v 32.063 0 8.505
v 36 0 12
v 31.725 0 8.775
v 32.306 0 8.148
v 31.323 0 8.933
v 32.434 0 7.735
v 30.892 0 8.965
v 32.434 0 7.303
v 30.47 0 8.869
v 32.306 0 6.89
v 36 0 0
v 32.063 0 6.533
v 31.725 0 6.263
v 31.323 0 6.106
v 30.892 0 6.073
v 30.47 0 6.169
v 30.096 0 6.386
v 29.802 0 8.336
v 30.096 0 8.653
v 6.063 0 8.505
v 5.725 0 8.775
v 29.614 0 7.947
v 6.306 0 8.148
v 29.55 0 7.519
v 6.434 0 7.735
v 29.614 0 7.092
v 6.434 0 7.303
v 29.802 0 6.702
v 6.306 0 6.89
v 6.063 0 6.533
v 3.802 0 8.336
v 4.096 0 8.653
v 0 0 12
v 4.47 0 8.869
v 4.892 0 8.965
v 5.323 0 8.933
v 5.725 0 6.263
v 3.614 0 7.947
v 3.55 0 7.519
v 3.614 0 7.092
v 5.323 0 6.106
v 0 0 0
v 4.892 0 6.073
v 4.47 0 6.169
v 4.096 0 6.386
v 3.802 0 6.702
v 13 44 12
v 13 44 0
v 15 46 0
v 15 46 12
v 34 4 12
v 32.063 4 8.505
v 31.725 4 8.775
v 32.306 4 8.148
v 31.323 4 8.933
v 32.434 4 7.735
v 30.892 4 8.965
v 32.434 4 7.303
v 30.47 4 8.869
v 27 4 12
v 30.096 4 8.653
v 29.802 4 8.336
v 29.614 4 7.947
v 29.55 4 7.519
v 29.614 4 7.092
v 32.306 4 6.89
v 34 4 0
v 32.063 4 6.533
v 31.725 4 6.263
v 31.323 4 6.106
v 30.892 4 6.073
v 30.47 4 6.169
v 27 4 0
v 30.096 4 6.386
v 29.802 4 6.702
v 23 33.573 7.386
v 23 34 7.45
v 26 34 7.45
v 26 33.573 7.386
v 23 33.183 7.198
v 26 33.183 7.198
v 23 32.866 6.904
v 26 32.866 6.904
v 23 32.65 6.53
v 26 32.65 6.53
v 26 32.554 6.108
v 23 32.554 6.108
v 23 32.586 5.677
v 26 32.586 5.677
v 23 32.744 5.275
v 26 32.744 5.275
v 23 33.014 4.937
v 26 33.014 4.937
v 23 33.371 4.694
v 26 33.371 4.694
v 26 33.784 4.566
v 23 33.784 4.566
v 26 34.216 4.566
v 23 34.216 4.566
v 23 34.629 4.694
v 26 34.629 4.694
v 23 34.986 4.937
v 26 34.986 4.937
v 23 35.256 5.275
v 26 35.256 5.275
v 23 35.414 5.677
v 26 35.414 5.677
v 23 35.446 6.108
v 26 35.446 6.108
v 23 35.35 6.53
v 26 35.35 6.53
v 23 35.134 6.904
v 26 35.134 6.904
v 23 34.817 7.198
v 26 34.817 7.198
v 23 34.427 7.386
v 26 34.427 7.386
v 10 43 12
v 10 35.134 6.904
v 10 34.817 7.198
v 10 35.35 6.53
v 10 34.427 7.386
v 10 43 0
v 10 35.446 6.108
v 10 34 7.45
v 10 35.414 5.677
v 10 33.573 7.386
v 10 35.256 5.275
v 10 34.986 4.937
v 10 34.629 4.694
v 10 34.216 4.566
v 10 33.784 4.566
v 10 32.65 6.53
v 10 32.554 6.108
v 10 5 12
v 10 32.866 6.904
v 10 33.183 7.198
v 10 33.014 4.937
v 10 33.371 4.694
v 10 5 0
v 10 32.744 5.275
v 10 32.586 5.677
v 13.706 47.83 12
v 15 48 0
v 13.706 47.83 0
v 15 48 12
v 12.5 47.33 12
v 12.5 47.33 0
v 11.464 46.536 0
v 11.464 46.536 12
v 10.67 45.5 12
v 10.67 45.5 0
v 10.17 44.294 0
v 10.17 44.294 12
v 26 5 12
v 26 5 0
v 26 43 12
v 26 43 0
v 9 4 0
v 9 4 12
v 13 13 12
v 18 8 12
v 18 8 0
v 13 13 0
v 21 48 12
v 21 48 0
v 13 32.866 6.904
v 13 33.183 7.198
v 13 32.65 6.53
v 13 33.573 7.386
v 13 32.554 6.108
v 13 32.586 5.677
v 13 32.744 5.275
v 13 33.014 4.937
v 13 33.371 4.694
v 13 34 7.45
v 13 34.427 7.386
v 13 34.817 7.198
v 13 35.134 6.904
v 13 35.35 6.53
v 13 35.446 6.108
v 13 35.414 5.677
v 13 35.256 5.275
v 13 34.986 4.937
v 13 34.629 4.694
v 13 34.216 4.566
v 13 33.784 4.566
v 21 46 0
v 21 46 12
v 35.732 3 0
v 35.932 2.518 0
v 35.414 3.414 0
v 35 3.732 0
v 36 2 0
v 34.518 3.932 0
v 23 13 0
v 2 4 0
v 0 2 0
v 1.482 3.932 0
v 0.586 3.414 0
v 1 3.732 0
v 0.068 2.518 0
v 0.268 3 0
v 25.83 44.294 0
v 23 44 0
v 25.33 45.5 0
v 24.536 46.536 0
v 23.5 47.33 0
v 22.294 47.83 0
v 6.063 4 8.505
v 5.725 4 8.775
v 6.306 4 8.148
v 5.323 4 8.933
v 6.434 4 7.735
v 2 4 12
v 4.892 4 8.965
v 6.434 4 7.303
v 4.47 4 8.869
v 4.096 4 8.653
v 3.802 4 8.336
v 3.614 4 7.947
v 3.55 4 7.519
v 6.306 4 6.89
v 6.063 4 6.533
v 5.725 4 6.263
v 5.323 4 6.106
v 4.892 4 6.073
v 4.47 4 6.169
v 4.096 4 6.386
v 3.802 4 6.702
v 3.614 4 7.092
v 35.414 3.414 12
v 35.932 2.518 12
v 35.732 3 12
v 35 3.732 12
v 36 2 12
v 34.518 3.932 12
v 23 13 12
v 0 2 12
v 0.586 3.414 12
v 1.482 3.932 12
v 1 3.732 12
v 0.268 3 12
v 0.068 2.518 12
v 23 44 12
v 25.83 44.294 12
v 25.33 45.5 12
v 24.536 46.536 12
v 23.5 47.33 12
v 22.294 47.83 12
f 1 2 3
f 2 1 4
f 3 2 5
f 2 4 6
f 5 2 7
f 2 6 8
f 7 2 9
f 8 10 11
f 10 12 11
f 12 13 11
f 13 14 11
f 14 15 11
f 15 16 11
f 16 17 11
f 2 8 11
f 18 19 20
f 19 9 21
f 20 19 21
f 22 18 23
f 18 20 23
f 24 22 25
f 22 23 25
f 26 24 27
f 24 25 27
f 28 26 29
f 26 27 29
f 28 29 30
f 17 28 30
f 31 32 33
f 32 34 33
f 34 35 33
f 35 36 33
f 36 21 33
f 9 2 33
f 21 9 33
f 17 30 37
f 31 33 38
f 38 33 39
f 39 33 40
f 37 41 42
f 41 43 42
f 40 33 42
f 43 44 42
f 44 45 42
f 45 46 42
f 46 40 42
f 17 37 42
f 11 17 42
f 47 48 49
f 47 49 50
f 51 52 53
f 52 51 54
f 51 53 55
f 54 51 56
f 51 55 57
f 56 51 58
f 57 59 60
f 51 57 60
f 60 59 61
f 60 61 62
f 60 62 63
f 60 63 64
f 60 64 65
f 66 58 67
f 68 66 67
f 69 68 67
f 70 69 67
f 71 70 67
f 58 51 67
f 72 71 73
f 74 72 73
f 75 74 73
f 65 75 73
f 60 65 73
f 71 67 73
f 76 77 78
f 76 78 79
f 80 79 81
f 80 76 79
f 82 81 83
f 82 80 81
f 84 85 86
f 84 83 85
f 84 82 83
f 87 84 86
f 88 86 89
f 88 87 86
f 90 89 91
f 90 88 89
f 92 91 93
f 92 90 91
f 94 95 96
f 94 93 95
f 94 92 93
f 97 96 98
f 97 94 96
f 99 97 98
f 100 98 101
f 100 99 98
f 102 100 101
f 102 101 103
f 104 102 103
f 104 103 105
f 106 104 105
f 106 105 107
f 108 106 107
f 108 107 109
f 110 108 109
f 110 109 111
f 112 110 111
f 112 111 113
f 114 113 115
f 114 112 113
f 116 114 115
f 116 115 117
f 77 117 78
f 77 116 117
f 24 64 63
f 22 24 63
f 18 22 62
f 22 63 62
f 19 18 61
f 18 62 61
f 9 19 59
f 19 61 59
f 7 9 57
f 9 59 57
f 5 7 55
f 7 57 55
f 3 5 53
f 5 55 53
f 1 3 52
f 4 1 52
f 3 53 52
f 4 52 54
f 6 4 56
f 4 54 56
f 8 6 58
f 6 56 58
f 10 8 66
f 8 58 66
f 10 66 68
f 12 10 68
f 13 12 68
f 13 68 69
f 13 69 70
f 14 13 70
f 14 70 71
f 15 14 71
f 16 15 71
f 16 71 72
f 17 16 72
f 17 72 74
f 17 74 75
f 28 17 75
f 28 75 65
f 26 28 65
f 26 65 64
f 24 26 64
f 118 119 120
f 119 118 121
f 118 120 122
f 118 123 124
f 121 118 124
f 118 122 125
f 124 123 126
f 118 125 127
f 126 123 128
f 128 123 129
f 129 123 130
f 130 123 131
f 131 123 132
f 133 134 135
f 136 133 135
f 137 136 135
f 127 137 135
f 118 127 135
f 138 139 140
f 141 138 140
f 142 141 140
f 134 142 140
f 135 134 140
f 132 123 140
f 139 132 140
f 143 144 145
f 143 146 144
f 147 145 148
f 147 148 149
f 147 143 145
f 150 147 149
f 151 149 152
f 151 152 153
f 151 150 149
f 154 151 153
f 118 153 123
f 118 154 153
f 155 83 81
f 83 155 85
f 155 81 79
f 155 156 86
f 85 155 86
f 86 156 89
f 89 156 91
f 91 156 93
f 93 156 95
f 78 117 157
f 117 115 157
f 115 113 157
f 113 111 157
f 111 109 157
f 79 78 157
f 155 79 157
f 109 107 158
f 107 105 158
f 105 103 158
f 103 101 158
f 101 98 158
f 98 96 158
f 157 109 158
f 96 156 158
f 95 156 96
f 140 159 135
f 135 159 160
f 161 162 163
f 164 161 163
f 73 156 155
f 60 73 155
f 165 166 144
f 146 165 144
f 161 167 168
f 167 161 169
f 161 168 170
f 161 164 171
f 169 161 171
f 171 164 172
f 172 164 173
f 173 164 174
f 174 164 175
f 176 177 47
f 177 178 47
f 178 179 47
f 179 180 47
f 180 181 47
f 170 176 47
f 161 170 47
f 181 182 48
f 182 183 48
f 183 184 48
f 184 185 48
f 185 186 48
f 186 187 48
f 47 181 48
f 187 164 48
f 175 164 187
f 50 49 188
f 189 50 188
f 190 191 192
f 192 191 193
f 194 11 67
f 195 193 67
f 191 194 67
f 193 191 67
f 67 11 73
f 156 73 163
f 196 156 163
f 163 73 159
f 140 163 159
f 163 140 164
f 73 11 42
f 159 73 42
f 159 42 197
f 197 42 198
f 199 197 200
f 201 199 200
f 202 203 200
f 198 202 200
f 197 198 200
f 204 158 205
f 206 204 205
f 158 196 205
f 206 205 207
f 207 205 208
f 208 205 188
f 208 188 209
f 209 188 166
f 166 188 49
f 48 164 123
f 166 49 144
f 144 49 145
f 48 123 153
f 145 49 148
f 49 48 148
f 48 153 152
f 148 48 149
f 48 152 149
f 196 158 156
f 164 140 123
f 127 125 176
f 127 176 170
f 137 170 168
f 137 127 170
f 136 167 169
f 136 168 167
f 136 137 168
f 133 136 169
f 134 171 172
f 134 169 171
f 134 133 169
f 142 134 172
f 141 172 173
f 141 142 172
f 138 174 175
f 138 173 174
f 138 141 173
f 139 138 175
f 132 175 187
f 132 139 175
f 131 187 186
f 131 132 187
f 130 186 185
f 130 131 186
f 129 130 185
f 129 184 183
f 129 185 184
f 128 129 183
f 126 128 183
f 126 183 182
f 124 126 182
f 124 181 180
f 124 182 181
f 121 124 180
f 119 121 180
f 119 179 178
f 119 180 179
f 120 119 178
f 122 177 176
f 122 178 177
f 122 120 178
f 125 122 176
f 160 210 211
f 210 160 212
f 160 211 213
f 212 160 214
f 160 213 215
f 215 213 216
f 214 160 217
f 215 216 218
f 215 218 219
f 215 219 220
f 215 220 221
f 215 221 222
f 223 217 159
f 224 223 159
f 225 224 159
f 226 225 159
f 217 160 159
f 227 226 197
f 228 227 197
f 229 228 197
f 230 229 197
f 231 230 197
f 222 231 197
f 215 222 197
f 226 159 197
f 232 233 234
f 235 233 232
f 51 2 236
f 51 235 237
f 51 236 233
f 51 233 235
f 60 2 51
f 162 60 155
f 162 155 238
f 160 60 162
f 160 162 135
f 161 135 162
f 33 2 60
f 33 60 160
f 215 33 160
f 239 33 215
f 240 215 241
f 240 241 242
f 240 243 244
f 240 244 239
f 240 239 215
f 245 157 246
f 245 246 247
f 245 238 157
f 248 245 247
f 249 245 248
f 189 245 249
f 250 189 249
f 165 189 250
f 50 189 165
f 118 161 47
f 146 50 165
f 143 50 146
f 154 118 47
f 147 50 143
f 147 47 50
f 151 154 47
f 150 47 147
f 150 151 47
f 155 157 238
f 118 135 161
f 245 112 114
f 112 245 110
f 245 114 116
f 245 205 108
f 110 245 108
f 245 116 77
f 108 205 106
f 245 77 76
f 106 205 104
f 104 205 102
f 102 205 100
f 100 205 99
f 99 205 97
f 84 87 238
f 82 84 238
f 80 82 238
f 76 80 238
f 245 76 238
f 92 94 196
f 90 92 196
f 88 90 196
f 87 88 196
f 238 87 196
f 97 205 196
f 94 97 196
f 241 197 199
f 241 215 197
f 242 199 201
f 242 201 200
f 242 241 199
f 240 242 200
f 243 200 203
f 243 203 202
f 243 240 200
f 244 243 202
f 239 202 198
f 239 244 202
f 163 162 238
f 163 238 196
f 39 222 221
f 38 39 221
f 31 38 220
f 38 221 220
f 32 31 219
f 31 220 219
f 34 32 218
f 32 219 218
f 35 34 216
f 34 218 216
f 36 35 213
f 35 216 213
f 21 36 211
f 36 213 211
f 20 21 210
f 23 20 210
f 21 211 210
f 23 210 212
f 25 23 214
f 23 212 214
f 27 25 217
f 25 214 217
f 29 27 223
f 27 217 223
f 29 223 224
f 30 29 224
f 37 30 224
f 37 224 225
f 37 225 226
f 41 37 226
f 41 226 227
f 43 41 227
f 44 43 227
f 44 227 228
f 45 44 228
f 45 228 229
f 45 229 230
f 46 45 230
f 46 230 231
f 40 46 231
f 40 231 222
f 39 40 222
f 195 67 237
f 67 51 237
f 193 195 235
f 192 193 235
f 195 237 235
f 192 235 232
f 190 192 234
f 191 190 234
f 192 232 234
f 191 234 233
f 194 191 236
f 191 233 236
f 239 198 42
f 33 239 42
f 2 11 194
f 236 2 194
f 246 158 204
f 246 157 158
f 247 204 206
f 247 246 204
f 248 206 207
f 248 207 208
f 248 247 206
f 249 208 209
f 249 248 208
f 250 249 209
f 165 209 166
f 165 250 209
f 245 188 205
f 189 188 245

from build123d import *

# Parameters (mm, degrees)
EXTRUDE_1_DEPTH          = 12
CUT_EXTRUDE_1_DEPTH      = 15
CUT_EXTRUDE_1_DEPTH_BACK = 15
SKETCH_2_R               = 1.45
SKETCH_3_R               = 1.45
CUT_EXTRUDE_2_DEPTH      = 15
FILLET_2_R               = 5
FILLET_3_R               = 2
CHAMFER_1_SIZE           = 2
SKETCH_4_W               = 12
SKETCH_4_H               = 8
EXTRUDE_2_DEPTH          = 10
CHAMFER_2_SIZE           = 5
CHAMFER_3_SIZE           = 1


with BuildPart() as part:
    # 草图1 → 凸台-拉伸1 (new body)
    with BuildSketch(Plane.XY):
        Polygon((0, 0), (13, 0), (13, 46), (23, 46), (23, 0), (36, 0), (36, 4), (26, 4), (26, 48), (10, 48), (10, 4), (0, 4), align=None)
    extrude(amount=EXTRUDE_1_DEPTH)

    # 草图2 → 切除-拉伸1 (cut, two sides: drawn at the far end of the back side and taken through both)
    with BuildSketch(Plane(origin=(13, 0, 0), x_dir=(0, 0, -1), z_dir=(1, 0, 0)).offset(-CUT_EXTRUDE_1_DEPTH_BACK)):
        with Locations(Location((-6, 34, 0), (0, 0, 180))):
            Circle(SKETCH_2_R)
    extrude(amount=CUT_EXTRUDE_1_DEPTH + CUT_EXTRUDE_1_DEPTH_BACK, mode=Mode.SUBTRACT)

    # 草图3 → 切除-拉伸2 (cut)
    with BuildSketch(Plane(origin=(0, 4, 0), x_dir=(1, 0, 0), z_dir=(0, 1, 0))):
        with Locations(Location((5, -7.519173445, 0), (0, 0, 180))):
            Circle(SKETCH_3_R)
        with Locations(Location((31, -7.519173445, 0), (0, 0, 180))):
            Circle(SKETCH_3_R)
    extrude(amount=-CUT_EXTRUDE_2_DEPTH, mode=Mode.SUBTRACT)

    # 圆角2
    fillet_2_edges = [part.edges().sort_by_distance(p)[0] for p in [
        (10, 48, 6),
        (26, 48, 6),
    ]]
    fillet(fillet_2_edges, radius=FILLET_2_R)

    # 圆角3
    fillet_3_edges = [part.edges().sort_by_distance(p)[0] for p in [
        (0, 4, 6),
        (36, 4, 6),
    ]]
    fillet(fillet_3_edges, radius=FILLET_3_R)

    # 倒角1
    chamfer_1_edges = [part.edges().sort_by_distance(p)[0] for p in [
        (23, 46, 6),
        (13, 46, 6),
    ]]
    chamfer(chamfer_1_edges, length=CHAMFER_1_SIZE)

    # 草图4 → 凸台-拉伸2 (add)
    with BuildSketch(Plane(origin=(13, 0, 0), x_dir=(0, 0, -1), z_dir=(1, 0, 0))):
        with Locations((-6, 4)):
            Rectangle(SKETCH_4_W, SKETCH_4_H)
    extrude(amount=EXTRUDE_2_DEPTH)

    # 倒角2
    chamfer_2_edges = [part.edges().sort_by_distance(p)[0] for p in [
        (13, 8, 6),
        (23, 8, 6),
    ]]
    chamfer(chamfer_2_edges, length=CHAMFER_2_SIZE - 0.0001)  # a hair under: the kernel refuses the full size

    # 倒角3
    chamfer_3_edges = [part.edges().sort_by_distance(p)[0] for p in [
        (10, 4, 6),
        (26, 4, 6),
    ]]
    chamfer(chamfer_3_edges, length=CHAMFER_3_SIZE)


solid = part.part
